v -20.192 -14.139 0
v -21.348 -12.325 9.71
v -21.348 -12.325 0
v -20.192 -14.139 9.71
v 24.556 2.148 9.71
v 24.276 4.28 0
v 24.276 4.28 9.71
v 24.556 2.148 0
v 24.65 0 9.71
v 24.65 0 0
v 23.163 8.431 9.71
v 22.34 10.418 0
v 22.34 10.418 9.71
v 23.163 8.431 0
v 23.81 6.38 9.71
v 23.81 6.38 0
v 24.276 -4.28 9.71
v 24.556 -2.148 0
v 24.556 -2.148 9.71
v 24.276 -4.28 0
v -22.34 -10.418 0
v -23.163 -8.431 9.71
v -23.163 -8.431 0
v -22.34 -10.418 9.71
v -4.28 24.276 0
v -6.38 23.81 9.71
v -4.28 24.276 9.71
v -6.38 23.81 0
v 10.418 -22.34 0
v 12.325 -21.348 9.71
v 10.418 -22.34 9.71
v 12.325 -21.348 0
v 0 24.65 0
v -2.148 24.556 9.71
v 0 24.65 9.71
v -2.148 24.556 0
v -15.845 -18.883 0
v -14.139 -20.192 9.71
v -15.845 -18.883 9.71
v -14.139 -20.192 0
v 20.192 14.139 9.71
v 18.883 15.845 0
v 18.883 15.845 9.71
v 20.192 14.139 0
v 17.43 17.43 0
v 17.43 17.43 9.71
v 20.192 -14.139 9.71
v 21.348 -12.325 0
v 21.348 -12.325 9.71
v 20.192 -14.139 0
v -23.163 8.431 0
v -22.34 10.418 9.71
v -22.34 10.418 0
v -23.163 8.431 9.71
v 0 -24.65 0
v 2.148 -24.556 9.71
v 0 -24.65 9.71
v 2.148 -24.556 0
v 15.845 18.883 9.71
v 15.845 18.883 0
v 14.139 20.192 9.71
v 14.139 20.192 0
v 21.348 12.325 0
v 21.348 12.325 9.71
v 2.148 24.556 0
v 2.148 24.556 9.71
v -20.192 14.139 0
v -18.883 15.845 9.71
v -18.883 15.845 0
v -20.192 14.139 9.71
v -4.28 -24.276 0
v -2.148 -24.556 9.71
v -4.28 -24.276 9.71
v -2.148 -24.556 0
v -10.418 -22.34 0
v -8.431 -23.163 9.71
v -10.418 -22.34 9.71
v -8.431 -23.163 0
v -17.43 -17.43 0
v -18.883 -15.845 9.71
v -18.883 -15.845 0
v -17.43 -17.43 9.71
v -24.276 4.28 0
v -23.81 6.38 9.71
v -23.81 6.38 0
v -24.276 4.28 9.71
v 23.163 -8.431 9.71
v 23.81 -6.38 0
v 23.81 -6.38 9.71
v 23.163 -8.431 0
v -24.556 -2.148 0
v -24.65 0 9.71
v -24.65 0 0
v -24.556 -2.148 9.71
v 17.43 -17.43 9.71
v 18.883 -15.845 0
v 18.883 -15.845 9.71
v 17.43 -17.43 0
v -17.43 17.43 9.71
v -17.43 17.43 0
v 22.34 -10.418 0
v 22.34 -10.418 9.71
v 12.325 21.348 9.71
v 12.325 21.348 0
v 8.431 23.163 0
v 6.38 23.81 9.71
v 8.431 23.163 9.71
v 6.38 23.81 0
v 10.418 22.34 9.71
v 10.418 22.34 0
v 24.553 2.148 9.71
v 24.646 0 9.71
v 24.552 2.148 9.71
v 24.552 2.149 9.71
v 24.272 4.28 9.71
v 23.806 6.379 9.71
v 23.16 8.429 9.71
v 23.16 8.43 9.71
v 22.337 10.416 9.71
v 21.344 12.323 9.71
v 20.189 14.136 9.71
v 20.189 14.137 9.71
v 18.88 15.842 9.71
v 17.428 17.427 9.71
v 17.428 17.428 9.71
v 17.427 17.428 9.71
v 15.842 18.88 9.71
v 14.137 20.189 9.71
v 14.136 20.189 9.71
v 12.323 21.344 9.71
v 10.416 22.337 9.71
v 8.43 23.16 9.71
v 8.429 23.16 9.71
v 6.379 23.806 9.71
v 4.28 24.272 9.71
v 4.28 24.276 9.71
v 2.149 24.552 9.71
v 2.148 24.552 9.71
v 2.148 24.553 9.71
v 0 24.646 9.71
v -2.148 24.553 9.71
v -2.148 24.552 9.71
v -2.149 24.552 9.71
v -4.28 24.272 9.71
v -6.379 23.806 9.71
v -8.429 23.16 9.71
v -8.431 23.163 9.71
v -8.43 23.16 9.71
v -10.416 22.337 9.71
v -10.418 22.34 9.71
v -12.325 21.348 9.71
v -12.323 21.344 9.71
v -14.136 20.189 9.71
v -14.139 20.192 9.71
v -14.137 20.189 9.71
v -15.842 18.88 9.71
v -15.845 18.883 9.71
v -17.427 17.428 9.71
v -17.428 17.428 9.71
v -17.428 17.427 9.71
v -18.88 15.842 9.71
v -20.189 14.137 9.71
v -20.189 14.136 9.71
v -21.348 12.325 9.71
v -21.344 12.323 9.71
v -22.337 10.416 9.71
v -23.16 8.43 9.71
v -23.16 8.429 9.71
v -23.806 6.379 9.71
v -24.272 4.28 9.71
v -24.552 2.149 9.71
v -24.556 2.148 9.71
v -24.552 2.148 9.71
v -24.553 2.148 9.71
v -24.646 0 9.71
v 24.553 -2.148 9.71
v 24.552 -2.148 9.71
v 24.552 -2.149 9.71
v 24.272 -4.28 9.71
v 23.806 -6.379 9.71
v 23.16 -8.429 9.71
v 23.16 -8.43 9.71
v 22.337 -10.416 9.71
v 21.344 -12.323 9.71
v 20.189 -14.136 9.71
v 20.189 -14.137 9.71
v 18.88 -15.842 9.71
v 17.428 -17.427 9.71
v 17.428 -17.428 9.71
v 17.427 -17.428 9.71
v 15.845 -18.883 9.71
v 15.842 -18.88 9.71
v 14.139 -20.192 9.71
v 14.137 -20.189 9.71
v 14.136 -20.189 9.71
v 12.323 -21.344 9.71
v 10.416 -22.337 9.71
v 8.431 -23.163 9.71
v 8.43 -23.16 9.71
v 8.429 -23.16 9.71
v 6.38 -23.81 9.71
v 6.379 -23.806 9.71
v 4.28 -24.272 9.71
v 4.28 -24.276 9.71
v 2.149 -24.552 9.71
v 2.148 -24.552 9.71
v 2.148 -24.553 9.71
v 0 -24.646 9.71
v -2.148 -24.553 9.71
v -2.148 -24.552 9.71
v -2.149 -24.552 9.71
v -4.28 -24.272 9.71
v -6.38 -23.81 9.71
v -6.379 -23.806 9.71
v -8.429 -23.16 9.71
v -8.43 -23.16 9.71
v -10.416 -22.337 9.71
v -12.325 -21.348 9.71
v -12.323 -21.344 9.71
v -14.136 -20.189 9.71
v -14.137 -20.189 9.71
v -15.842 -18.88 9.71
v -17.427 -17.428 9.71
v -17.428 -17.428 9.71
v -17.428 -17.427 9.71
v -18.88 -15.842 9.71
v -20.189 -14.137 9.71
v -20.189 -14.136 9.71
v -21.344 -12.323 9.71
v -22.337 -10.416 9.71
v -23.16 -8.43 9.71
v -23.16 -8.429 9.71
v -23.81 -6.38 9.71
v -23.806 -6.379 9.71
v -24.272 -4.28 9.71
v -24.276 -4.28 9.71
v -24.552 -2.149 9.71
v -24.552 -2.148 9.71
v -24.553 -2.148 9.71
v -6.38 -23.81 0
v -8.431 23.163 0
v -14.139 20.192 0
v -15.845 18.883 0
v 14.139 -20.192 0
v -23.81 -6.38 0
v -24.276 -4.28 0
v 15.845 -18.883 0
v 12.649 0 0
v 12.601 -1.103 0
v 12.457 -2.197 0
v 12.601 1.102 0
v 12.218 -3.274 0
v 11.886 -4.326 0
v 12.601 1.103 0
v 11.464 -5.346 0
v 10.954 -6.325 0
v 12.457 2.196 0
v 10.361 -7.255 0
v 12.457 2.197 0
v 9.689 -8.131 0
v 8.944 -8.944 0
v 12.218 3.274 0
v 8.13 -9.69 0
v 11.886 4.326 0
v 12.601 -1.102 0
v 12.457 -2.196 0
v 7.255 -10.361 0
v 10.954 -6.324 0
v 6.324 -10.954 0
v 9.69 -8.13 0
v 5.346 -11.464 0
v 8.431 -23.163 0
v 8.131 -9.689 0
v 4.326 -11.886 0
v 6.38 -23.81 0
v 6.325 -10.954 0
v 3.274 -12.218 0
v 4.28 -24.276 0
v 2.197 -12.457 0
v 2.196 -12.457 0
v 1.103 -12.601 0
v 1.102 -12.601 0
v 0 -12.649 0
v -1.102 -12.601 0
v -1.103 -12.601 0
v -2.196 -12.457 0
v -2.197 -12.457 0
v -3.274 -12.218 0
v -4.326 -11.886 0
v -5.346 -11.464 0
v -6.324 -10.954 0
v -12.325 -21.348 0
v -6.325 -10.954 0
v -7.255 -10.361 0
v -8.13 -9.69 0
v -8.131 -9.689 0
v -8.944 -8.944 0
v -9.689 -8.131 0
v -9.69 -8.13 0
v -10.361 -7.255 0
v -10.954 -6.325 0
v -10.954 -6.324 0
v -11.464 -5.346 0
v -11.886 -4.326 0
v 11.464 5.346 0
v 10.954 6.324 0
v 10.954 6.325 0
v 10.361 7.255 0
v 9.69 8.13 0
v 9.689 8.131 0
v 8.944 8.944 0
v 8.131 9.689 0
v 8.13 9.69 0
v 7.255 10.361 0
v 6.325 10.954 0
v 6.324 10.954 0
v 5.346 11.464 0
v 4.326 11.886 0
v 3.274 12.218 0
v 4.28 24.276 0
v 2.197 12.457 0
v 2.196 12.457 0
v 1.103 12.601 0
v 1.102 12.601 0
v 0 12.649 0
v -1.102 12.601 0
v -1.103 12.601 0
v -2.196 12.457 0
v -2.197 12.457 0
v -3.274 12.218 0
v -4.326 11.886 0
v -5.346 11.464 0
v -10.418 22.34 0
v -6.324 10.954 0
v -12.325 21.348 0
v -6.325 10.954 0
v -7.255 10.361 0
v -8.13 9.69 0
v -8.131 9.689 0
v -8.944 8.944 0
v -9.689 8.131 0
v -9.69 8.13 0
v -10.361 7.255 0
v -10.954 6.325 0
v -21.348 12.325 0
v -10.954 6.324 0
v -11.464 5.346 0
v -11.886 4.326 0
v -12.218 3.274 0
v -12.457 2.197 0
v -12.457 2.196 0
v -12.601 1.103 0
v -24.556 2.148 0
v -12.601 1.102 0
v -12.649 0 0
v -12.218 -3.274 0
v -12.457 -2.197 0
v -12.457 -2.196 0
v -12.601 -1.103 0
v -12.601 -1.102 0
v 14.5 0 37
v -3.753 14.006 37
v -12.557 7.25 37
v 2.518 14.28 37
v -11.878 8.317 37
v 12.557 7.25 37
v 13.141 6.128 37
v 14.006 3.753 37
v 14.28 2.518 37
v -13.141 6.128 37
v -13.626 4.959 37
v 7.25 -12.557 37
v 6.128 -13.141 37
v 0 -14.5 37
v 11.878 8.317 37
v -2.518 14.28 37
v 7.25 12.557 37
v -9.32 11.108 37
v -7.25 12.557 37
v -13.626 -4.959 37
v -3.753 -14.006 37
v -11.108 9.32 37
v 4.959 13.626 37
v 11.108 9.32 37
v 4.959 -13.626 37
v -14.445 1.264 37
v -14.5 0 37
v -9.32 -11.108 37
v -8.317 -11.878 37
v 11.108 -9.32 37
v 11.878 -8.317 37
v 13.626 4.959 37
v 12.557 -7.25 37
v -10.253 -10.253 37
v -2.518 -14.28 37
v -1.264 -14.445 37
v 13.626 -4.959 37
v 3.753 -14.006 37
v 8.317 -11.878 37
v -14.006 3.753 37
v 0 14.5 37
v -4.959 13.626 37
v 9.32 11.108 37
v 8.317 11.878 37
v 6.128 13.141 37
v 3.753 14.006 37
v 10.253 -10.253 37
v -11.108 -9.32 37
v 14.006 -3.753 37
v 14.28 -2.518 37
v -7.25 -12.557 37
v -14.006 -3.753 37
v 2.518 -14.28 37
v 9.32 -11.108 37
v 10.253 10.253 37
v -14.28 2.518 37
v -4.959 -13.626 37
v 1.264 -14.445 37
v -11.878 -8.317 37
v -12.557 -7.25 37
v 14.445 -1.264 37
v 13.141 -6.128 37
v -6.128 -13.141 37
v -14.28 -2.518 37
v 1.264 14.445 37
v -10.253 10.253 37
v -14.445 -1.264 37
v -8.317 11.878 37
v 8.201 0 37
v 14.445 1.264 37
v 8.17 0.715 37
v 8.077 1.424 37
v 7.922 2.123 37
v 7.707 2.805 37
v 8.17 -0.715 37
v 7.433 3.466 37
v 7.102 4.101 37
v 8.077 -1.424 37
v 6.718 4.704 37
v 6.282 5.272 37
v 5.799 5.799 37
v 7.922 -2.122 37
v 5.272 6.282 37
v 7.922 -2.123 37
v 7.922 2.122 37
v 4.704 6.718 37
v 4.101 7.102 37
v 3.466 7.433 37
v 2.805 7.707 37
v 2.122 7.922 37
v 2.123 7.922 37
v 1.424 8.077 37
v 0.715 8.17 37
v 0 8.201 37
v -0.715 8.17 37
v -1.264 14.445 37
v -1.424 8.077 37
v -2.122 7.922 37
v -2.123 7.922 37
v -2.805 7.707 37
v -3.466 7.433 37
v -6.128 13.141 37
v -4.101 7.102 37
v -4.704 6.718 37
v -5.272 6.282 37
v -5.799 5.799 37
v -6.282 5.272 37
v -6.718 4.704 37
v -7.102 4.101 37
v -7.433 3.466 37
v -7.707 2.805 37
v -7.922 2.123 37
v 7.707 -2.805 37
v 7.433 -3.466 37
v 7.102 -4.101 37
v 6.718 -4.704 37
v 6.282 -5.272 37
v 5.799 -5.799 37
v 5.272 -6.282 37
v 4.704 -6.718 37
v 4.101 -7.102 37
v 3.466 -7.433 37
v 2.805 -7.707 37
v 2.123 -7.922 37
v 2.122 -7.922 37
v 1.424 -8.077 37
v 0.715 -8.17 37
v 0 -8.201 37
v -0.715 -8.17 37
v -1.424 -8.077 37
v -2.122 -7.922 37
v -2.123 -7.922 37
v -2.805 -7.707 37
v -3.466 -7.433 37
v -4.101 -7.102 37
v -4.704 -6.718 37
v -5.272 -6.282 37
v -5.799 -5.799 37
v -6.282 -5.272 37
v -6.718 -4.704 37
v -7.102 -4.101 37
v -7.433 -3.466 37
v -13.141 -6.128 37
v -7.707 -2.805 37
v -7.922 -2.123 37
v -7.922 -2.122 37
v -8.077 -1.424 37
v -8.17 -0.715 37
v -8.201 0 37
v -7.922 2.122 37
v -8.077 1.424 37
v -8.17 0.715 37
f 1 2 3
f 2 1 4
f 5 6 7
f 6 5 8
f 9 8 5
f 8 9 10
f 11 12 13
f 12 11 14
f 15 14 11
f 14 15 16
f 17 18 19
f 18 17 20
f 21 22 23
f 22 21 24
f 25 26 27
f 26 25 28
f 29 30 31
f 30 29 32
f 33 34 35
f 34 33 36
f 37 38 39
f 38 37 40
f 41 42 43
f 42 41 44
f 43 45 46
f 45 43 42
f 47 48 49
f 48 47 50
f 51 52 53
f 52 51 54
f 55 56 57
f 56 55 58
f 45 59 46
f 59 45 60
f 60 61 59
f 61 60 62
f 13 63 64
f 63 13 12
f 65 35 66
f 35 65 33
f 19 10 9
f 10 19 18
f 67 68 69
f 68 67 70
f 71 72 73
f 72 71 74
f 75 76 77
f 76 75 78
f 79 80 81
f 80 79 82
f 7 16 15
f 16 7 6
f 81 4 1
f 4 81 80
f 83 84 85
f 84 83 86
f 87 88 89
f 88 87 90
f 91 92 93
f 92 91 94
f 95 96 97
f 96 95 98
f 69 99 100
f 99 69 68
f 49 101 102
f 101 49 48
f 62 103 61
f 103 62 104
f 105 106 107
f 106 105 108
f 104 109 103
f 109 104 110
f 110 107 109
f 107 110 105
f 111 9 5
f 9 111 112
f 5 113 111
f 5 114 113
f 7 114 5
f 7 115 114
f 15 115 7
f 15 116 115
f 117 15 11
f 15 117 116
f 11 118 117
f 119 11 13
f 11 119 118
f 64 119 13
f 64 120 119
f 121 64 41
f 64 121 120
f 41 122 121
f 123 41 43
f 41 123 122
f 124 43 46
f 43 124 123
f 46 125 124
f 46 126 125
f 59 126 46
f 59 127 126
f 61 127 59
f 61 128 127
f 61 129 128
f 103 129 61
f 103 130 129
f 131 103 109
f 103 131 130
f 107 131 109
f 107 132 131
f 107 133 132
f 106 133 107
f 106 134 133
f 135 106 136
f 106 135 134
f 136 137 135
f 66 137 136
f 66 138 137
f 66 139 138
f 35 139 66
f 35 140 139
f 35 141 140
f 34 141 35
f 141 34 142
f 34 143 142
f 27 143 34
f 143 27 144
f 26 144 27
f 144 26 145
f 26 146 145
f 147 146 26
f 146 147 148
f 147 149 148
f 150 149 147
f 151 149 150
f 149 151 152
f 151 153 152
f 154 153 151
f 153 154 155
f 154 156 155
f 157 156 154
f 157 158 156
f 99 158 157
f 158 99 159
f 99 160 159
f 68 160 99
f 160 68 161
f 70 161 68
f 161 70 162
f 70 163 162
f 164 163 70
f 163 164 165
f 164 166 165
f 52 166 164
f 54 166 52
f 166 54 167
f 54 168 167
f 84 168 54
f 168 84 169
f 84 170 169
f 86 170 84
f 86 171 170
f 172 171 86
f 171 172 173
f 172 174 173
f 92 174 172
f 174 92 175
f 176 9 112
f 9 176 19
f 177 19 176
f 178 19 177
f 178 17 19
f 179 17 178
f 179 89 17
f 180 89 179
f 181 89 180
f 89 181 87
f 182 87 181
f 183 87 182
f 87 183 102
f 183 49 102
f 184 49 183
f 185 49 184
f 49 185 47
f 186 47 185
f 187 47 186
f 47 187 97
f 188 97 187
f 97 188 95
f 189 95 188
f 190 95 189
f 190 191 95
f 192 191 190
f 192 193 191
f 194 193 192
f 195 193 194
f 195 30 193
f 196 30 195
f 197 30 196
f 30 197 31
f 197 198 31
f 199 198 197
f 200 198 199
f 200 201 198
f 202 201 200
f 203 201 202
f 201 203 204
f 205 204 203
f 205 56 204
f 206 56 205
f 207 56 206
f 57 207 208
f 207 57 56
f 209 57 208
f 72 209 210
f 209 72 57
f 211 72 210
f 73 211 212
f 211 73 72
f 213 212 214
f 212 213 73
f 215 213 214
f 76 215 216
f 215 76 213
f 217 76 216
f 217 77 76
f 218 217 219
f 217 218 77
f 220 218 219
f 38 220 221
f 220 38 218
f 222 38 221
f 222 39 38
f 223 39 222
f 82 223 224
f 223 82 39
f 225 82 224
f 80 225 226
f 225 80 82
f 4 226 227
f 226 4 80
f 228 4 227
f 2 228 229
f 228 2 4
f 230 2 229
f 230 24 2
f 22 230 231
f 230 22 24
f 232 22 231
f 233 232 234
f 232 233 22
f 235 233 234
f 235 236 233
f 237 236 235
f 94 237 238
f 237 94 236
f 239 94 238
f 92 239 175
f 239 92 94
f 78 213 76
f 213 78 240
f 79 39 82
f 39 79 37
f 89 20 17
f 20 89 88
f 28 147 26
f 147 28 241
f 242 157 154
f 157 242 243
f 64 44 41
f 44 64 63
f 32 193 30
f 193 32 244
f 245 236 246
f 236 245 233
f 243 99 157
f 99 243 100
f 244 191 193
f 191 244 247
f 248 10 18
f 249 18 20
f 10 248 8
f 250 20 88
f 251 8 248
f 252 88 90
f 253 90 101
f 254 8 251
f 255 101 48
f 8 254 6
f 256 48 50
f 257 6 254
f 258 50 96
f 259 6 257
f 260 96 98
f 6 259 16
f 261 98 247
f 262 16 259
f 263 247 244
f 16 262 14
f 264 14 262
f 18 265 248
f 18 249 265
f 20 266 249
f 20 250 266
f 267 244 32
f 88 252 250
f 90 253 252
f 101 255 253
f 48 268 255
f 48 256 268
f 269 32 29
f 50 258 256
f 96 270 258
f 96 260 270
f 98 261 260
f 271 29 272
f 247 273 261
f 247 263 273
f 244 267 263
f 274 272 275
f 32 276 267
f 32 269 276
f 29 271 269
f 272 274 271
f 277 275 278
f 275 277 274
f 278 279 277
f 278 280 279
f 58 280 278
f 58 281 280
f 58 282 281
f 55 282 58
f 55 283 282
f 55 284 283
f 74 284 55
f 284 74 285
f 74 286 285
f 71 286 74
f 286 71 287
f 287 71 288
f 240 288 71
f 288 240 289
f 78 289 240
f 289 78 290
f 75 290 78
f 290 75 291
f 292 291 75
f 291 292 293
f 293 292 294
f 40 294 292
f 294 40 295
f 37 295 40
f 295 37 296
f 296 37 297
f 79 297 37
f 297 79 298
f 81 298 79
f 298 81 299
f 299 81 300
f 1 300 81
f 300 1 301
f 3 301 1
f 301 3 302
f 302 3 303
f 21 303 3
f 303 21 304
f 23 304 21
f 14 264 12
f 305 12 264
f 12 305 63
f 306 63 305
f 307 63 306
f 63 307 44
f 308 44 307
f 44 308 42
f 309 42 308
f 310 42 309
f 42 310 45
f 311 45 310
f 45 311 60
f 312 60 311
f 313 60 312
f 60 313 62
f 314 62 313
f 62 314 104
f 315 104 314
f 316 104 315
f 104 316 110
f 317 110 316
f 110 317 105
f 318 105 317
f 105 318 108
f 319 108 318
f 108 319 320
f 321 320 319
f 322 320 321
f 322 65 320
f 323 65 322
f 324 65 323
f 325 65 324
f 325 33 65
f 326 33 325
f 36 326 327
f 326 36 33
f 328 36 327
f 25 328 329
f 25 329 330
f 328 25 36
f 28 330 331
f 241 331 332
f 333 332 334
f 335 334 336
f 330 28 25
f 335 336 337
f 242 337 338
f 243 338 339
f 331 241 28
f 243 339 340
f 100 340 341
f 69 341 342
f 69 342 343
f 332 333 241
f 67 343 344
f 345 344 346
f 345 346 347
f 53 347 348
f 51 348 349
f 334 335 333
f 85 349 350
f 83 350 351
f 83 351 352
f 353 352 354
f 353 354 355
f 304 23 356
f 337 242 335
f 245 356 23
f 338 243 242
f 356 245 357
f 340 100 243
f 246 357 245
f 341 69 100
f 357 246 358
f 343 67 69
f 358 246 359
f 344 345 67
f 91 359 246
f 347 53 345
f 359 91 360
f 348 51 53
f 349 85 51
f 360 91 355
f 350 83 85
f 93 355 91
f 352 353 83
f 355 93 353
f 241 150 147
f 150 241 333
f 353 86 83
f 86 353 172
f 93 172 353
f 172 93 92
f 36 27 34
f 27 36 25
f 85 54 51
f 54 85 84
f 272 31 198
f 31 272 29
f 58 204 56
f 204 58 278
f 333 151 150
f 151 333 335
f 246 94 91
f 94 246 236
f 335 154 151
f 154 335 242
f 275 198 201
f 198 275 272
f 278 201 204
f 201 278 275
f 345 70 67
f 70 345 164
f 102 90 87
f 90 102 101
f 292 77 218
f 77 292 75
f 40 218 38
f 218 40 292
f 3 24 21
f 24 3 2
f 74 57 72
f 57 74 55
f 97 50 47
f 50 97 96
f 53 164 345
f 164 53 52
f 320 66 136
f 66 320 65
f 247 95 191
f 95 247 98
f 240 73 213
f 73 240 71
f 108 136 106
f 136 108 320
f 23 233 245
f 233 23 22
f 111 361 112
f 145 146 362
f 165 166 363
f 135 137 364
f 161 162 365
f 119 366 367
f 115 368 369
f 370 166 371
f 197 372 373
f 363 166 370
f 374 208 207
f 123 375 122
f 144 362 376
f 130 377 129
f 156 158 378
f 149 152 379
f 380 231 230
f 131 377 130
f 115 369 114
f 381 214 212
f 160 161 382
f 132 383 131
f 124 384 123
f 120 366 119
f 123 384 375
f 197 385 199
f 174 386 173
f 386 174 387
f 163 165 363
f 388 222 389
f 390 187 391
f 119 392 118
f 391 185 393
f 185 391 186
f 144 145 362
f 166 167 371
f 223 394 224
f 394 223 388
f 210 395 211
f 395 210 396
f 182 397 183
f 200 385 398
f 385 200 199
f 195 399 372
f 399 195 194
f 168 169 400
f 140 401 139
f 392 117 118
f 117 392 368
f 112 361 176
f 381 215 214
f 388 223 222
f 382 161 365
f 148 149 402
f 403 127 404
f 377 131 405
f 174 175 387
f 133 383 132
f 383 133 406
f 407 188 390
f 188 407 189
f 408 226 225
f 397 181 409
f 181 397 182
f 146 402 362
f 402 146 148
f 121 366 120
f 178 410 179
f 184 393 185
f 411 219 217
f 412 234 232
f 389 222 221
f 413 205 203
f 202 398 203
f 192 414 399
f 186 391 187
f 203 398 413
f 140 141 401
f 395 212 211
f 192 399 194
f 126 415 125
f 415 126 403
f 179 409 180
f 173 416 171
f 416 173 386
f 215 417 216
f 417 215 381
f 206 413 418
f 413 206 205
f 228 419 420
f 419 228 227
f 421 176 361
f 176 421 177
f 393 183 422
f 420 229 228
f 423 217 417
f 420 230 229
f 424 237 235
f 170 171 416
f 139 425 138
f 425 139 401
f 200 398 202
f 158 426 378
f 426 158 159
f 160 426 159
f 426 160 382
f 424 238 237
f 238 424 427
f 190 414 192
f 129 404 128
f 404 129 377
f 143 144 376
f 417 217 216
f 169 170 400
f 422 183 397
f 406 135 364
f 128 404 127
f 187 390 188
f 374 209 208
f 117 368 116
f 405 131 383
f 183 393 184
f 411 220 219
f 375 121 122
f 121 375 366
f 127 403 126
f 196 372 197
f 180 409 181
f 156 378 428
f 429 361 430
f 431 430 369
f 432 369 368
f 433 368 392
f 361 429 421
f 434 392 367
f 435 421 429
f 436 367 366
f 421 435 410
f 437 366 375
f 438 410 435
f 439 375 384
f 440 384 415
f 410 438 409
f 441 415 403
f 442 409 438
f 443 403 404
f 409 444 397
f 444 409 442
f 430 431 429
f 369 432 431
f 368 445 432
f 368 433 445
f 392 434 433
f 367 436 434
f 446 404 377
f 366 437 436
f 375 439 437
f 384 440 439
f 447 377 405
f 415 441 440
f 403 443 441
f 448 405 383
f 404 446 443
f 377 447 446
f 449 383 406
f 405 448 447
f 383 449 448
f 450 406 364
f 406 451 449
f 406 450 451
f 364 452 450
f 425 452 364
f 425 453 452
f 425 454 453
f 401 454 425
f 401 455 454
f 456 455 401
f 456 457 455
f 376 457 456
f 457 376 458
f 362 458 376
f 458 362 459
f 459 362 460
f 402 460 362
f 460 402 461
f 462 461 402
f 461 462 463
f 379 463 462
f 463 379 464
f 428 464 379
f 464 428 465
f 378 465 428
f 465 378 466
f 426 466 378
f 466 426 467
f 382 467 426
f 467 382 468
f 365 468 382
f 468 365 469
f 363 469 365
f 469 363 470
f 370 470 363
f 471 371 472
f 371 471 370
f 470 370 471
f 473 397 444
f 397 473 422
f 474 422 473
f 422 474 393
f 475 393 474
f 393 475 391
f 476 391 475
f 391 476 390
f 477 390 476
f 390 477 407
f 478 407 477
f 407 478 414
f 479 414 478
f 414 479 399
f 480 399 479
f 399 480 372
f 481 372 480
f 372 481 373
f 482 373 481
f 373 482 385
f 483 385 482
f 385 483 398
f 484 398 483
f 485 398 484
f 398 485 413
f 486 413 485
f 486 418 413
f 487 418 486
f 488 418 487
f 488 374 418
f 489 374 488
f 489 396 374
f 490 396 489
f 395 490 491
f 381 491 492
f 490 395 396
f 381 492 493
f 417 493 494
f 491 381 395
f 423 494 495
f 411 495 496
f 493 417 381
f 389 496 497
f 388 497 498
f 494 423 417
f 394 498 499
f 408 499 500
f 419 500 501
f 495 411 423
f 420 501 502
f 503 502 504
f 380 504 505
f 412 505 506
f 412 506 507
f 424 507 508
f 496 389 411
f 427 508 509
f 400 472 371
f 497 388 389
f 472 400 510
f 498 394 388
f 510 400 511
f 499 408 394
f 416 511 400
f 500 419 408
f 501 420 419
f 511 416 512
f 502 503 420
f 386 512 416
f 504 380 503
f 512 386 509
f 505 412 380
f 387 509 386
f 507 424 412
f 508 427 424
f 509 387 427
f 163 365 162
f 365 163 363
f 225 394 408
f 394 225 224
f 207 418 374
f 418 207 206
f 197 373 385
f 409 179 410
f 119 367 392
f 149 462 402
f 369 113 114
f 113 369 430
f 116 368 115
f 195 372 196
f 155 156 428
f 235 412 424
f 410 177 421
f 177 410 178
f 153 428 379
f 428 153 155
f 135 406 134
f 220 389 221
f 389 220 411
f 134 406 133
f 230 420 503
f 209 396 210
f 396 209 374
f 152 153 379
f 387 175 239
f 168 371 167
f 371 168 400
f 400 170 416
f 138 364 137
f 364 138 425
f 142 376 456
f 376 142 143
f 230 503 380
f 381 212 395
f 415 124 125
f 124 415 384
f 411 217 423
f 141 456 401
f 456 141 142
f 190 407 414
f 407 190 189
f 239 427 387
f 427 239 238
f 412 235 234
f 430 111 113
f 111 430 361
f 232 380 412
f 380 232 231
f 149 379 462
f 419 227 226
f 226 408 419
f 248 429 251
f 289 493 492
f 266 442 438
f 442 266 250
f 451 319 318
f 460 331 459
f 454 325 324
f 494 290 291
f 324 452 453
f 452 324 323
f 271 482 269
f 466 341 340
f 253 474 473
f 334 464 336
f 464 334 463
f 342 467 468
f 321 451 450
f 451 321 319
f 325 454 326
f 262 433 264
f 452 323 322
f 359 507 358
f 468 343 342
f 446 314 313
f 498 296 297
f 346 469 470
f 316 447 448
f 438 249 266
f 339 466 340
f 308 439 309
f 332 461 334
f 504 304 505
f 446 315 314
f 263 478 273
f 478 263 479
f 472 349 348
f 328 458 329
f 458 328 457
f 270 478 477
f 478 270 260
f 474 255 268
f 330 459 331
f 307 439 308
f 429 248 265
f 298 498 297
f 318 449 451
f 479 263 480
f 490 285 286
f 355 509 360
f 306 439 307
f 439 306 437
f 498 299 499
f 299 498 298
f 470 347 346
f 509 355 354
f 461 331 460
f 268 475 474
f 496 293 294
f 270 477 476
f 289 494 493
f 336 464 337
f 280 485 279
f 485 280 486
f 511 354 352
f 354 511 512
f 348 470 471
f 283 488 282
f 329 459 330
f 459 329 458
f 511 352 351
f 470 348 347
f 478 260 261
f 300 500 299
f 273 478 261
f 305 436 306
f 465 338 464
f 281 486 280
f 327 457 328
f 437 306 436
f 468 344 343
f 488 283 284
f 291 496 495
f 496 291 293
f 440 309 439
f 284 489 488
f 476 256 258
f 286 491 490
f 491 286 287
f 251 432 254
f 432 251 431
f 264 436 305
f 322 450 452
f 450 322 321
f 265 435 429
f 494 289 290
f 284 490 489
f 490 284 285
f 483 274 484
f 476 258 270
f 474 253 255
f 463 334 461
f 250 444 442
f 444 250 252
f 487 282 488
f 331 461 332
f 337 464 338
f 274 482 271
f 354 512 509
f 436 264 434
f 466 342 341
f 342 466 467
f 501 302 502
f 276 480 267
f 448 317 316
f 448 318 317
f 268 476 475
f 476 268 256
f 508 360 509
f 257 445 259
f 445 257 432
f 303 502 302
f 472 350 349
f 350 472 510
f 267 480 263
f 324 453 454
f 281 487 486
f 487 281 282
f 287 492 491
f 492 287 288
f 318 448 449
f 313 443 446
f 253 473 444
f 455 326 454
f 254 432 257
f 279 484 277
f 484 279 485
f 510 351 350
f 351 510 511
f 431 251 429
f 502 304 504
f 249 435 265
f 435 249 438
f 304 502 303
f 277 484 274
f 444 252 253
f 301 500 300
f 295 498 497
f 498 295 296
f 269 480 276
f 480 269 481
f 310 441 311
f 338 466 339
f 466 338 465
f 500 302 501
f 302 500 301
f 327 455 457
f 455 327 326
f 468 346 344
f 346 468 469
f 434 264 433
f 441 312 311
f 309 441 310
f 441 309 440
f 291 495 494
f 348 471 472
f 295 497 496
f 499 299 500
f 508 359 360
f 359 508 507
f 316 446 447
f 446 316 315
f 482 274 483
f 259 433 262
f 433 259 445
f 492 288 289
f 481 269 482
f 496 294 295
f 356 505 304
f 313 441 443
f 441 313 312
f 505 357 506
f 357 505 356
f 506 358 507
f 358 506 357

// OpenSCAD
// Sunshade lower clip
//
// Copyright (C) 2019 Jeremy Bennett <www.jeremybennett.com>
// Contributor: Jeremy Bennett <jeremy.bennett@embecosm.com>
//
// SPDX-License-Identifier: CC-BY-SA-4.0

// A shim to fit a narrow sunshade pole in a larger holder

OUTER_CONE_H = 27.3;
OUTER_UPPER_R = 49.3 / 2.0;
OUTER_LOWER_R = 29.0 / 2.0;

POLE_CONE_H = 37.0;
POLE_UPPER_R = 25.3 / 2.0;
POLE_LOWER_R = 16.4 / 2.0;

MINK_R = 2.0;
RIM_H = 4.0;
INNER_H = 25.0;
RIB_H = 20.0;
RIB_W = 2.0;
RIB_D = 1.5;
OUTER_R = 60.0 / 2.0;
INNER_R = 53.0 / 2.0;
POLE_R = 25.3 / 2.0;

// Very small value
EPS = 0.01;

// Very large value
INF = 1000.0;

module outer_cone () {
     union () {
	  cylinder (r = OUTER_UPPER_R, h = POLE_CONE_H - OUTER_CONE_H + EPS,
		    center = false, $fn = 72);
	  translate (v = [0, 0, POLE_CONE_H - OUTER_CONE_H])
	       cylinder (r1 = OUTER_UPPER_R, r2 = OUTER_LOWER_R,
			 h = OUTER_CONE_H, center = false, $fn = 72);
     }
}

module inner_cone () {
     translate (v = [0, 0, -EPS])
	  cylinder (r1 = POLE_UPPER_R, r2 = POLE_LOWER_R,
		    h = POLE_CONE_H + 2 * EPS, center = false, $fn = 72);
}

module lower_clip () {
     difference () {
	  outer_cone ();
	  inner_cone ();
     }
}

lower_clip ();
